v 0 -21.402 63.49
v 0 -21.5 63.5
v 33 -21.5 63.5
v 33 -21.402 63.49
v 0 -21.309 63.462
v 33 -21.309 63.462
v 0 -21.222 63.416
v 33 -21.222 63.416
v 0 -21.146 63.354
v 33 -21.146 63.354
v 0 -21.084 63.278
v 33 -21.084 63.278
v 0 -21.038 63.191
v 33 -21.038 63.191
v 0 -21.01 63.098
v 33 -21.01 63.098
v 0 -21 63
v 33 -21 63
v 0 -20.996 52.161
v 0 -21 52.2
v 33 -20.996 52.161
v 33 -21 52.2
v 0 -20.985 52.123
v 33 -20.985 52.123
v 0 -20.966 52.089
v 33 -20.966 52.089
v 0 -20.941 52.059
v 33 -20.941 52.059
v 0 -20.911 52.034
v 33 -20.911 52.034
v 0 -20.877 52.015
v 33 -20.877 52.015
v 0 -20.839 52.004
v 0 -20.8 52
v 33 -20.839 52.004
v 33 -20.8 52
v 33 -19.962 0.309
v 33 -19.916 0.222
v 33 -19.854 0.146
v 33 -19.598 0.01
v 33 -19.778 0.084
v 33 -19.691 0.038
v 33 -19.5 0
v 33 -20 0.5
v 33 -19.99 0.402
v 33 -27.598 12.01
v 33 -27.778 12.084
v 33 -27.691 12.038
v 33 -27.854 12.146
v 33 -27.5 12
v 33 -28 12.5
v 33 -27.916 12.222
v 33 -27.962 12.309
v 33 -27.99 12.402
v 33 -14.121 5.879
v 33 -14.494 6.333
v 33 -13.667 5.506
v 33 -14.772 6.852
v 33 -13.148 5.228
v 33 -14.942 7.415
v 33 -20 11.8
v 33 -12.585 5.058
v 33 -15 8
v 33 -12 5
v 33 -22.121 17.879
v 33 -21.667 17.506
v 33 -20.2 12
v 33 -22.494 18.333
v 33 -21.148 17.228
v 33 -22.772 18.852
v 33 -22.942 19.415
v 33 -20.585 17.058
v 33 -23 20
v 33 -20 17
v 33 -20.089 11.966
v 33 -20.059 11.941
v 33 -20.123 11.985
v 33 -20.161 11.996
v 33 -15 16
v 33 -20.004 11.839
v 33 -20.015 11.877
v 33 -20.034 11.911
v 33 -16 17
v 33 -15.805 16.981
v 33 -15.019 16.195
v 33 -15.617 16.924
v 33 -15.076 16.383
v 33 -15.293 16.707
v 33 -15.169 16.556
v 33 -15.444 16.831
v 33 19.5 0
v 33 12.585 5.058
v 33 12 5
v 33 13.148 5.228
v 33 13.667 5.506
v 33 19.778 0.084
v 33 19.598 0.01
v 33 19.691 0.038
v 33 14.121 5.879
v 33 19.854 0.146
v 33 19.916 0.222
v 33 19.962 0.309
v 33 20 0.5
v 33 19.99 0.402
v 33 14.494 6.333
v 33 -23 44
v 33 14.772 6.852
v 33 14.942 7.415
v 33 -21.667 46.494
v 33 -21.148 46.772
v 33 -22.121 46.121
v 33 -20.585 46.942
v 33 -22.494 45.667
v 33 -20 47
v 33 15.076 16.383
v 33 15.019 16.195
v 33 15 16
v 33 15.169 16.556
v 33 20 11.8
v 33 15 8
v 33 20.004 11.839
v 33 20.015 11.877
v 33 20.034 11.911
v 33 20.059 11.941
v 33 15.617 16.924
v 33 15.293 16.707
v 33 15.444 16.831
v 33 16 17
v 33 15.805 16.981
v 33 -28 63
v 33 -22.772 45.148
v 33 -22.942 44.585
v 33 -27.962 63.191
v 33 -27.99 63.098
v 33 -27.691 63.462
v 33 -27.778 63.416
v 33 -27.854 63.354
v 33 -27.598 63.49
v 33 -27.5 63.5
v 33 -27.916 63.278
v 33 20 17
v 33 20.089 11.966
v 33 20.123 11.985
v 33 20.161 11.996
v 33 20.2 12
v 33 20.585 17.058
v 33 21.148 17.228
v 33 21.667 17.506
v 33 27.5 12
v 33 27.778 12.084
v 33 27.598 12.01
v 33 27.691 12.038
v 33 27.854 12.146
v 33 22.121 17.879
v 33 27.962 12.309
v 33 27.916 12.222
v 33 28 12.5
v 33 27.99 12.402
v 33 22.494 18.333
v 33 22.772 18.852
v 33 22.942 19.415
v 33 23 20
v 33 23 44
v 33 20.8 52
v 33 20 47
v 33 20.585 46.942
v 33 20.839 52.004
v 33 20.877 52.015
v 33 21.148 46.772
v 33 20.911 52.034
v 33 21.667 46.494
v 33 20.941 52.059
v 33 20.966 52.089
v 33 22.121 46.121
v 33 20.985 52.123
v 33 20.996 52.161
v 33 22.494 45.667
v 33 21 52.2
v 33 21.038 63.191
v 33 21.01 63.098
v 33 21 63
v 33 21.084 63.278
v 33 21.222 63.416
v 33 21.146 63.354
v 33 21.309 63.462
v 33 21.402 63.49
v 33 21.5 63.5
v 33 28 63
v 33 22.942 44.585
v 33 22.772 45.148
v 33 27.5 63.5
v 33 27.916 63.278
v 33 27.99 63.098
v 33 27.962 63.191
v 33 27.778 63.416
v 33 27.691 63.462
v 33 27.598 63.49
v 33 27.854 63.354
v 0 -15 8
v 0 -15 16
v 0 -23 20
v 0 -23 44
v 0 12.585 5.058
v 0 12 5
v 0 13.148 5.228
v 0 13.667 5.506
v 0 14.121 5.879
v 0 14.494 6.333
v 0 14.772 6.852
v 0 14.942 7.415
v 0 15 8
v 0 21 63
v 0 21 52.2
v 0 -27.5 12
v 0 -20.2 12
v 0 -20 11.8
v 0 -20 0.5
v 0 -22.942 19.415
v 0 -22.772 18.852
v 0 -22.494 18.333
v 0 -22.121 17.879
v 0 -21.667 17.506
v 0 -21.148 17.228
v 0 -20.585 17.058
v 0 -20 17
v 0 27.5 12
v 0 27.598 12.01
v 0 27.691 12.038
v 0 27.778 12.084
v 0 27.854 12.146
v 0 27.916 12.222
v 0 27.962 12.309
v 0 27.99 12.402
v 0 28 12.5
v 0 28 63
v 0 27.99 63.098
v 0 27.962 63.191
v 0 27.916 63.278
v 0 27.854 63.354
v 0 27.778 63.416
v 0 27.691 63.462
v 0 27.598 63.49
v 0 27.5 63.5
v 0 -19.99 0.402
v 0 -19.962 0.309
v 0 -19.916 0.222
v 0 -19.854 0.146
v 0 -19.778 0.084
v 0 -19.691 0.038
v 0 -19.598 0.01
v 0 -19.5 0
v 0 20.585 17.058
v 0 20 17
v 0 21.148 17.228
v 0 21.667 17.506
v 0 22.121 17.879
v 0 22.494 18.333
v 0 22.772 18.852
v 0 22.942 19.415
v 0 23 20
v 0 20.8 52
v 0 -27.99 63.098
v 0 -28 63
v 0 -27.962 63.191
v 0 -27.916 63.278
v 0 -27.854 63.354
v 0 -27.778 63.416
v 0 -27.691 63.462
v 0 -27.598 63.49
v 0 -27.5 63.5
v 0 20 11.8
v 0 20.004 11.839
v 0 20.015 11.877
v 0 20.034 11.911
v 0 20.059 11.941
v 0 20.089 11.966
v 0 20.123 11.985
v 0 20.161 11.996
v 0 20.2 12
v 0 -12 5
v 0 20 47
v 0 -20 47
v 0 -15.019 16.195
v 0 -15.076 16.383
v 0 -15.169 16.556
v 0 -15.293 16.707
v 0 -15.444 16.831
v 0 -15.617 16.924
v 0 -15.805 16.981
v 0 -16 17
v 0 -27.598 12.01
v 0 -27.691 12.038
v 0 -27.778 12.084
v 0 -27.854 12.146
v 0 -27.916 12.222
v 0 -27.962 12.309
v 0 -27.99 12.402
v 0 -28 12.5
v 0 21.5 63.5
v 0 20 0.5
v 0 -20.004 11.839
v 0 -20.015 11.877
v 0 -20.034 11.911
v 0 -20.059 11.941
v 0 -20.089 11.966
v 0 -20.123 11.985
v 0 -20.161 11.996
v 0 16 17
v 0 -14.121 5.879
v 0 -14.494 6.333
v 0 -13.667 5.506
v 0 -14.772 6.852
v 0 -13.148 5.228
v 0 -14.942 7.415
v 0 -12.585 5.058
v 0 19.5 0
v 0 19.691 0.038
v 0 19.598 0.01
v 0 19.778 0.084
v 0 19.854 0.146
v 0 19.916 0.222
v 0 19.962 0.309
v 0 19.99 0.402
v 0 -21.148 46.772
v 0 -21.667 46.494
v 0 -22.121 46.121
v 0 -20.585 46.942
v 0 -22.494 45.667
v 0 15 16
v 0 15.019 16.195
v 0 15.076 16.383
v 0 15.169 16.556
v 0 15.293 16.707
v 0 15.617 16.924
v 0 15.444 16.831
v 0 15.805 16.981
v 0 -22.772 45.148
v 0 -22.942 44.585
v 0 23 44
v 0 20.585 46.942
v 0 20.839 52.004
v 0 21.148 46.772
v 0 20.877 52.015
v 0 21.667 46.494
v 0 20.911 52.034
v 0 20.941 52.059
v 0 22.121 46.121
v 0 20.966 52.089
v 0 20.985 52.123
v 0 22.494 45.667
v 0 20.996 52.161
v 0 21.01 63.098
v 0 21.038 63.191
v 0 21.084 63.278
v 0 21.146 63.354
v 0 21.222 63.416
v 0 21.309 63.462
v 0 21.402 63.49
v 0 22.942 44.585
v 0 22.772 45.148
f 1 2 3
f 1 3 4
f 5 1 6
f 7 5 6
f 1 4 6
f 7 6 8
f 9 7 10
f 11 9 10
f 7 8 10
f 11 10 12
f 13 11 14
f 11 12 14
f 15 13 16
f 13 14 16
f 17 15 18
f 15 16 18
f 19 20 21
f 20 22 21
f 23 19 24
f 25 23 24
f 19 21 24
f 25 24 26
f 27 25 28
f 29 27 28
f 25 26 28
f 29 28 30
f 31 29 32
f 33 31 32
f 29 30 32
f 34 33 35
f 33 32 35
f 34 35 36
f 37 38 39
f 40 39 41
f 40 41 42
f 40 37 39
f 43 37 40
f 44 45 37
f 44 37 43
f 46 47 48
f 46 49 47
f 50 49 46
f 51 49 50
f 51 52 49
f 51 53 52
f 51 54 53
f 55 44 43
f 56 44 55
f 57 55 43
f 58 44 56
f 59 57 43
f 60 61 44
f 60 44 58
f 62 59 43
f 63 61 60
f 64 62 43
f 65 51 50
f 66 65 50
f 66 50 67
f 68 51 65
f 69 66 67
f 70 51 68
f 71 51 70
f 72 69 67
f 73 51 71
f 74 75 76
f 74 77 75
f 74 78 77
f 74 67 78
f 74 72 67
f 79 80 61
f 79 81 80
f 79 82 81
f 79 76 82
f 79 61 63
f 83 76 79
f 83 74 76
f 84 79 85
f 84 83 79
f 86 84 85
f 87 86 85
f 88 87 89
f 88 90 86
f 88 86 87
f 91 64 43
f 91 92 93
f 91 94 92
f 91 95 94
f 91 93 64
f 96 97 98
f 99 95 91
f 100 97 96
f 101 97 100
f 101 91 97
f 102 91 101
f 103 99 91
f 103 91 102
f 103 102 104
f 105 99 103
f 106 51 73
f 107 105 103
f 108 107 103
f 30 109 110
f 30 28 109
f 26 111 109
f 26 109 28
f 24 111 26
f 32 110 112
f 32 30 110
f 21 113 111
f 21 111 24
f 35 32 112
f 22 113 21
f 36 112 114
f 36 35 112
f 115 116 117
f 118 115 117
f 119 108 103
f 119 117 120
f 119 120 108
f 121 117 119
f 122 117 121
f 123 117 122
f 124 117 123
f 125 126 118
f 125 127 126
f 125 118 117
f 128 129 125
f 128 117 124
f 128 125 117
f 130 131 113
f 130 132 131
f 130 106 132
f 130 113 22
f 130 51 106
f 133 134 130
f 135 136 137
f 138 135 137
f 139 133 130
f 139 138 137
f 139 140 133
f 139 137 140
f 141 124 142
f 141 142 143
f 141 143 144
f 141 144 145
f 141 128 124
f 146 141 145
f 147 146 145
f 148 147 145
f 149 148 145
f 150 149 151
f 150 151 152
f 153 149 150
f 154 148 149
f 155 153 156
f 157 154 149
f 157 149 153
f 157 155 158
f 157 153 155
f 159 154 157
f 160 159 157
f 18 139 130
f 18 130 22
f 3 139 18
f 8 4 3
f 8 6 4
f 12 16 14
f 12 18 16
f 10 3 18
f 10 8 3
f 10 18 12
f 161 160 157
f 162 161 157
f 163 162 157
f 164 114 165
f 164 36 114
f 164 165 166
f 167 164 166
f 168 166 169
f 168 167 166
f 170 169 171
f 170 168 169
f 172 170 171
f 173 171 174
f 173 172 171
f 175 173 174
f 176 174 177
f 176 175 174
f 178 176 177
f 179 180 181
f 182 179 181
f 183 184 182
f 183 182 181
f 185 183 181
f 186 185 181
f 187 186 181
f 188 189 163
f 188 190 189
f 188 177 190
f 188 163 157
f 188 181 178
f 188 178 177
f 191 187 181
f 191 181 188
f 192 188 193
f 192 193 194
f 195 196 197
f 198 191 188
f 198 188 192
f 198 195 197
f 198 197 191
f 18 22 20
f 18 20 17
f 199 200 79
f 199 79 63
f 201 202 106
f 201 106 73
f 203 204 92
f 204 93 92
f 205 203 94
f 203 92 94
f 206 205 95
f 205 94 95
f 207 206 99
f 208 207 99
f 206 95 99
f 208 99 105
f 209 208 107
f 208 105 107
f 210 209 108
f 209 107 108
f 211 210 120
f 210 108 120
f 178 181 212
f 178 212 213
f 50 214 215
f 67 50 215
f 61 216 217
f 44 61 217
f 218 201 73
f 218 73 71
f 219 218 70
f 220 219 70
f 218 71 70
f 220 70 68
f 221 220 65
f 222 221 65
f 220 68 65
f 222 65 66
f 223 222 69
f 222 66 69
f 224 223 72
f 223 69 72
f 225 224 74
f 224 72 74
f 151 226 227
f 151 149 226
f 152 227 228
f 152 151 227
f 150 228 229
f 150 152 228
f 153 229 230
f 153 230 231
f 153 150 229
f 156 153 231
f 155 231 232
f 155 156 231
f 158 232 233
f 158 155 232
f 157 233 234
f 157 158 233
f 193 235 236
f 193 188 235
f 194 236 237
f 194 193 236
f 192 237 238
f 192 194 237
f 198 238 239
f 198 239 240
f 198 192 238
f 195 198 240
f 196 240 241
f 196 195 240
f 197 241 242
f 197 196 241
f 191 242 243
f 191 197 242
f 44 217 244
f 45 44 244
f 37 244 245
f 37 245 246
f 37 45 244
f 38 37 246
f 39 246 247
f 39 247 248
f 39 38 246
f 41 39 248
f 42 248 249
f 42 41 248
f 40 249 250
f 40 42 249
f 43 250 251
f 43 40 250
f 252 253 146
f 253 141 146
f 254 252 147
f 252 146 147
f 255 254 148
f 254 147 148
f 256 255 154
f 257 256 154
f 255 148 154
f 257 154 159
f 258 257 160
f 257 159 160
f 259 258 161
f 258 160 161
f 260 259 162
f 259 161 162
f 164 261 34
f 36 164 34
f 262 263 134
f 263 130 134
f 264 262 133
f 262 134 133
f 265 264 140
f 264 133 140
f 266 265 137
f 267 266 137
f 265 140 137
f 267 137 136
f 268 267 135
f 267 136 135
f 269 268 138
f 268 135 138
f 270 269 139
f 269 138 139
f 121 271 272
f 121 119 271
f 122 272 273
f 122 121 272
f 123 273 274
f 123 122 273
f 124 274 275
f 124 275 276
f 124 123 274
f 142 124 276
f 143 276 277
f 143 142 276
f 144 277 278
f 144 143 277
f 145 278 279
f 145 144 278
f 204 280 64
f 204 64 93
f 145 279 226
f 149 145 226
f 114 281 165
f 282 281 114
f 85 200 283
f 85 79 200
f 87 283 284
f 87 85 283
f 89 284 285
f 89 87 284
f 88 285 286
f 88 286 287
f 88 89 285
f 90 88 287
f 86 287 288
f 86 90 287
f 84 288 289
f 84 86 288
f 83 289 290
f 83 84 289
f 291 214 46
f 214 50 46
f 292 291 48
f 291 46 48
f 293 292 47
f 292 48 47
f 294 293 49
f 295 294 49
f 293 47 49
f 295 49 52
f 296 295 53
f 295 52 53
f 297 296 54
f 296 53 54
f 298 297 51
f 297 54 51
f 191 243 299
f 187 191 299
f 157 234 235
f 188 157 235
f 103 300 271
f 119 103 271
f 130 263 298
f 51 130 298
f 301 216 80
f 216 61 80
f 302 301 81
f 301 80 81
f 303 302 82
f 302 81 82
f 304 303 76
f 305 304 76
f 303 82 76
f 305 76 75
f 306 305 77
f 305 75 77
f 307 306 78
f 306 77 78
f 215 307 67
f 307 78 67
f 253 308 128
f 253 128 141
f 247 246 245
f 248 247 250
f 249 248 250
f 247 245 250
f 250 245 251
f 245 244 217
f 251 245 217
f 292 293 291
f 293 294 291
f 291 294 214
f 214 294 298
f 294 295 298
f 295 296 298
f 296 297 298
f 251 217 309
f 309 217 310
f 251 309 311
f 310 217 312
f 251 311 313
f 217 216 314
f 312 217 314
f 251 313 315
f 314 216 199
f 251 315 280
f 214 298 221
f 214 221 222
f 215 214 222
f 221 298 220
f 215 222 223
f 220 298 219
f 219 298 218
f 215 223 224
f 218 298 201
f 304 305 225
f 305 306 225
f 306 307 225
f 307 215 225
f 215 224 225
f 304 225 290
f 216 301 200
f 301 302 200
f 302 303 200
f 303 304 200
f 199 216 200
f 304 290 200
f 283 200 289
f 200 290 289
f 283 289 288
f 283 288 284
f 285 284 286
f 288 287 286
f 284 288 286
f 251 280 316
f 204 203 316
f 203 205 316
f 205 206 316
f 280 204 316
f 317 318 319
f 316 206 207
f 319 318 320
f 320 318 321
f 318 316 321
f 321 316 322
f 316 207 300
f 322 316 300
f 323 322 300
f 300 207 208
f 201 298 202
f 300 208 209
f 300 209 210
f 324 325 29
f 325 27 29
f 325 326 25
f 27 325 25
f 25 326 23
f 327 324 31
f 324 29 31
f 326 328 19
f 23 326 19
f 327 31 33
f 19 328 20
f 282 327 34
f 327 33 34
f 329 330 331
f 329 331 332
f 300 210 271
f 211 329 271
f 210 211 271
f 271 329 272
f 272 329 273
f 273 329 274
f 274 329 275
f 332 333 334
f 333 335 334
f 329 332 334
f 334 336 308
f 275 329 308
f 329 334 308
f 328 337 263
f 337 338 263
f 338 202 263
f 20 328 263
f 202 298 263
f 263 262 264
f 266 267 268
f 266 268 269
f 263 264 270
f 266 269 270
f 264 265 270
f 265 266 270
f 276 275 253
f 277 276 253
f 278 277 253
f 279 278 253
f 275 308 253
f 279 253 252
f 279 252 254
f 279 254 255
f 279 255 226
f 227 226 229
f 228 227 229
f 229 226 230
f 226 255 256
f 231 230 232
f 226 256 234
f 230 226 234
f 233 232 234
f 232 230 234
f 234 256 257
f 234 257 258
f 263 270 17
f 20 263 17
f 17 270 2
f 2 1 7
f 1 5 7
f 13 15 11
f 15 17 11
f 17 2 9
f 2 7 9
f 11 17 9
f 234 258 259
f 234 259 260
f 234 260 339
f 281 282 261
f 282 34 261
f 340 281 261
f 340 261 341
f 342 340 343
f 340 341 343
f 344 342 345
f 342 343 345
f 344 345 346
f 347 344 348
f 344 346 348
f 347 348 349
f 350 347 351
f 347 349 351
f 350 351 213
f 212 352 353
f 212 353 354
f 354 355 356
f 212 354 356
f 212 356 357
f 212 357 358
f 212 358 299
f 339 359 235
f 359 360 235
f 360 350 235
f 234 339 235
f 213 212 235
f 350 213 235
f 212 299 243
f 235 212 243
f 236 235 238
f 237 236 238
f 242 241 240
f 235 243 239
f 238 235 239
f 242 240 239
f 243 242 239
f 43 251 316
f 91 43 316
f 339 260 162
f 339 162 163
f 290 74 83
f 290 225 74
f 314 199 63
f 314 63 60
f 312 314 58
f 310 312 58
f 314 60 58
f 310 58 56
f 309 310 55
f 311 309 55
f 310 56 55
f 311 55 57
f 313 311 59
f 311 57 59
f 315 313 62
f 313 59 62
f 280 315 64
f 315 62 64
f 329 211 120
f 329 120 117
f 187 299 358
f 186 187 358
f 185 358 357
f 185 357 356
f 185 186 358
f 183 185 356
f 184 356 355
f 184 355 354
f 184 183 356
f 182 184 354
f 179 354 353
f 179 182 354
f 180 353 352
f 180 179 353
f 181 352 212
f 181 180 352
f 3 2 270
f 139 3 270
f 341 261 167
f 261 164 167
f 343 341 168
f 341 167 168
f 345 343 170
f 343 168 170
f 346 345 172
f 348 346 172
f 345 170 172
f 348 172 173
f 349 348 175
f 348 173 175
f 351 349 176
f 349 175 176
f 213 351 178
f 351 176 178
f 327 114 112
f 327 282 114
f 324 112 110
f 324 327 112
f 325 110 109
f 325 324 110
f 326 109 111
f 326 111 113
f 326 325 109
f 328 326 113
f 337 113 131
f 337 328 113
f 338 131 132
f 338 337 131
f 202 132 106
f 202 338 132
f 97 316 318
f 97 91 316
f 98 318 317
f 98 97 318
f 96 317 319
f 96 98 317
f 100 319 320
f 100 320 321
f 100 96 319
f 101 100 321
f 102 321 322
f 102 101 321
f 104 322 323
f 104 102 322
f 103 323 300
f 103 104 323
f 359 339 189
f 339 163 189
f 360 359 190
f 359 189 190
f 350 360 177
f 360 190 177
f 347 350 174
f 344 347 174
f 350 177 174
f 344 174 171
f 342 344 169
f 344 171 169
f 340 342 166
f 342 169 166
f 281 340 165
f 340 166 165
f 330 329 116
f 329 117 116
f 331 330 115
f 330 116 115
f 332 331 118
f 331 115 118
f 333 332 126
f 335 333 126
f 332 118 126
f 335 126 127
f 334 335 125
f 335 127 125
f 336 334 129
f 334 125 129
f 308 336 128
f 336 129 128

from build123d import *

# Parameters (mm, degrees)
F1_DEPTH    = 33
F2_T        = 5
F2_T3_DEPTH = 43
F3_R        = 0.2
F4_R        = 0.5
F5_R        = 3
F6_R        = 1


# Not quite as in the source:
# - a shell that OpenCascade refuses in one call is made with other operations: the cavity is built on its own and cut out


with BuildPart() as f1:
    # F0 (on Right) → F1 (new body)
    with BuildSketch(Plane.YZ):
        Polygon((-20, 12), (-20, 0), (20, 0), (20, 12), (28, 12), (28, 63.5), (21, 63.5), (21, 52), (-21, 52), (-21, 63.5), (-28, 63.5), (-28, 12), align=None)
    extrude(amount=F1_DEPTH)

    # F2: shell of thickness 5, made by hand


with BuildPart() as f2_core1:
    # F2_t2: copy of F1
    add(f1.part)

    # the walls: a layer under each face that stays
    f2_faces = [f2_core1.faces().sort_by_distance(p)[0] for p in [
        (16.5, -20, 6),
        (16.5, 0, 0),
        (16.5, 20, 6),
        (16.5, 24, 12),
        (16.5, 28, 37.75),
        (16.5, 24.5, 63.5),
        (16.5, 21, 57.75),
        (16.5, 0, 52),
        (16.5, -21, 57.75),
        (16.5, -24.5, 63.5),
        (16.5, -28, 37.75),
        (16.5, -24, 12),
    ]]
    thicken(f2_faces, amount=-F2_T, mode=Mode.SUBTRACT)

    # F2_s4 → F2_t3 (cut)
    with BuildSketch(Plane.YZ.offset(-5)):
        Polygon((-20.05, 11.95), (-15, 12), (-15, 17), (-20, 17), align=None)
        Polygon((20.05, 11.95), (15, 12), (15, 17), (20, 17), align=None)
        Polygon((20.95, 52.05), (26, 52), (26, 47), (21, 47), align=None)
        Polygon((-20.95, 52.05), (-21, 47), (-26, 47), (-26, 52), align=None)
    extrude(amount=F2_T3_DEPTH, mode=Mode.SUBTRACT)


with BuildPart() as f1_1:
    add(f1.part)

    # what is left inside the walls is the cavity
    f2_cavity = [f2_core1.part.solids().sort_by_distance(p)[0] for p in [
        (32.95, 0, 19),
    ]]
    add(f2_cavity, mode=Mode.SUBTRACT)

    # F3
    f3_edges = [f1_1.edges().sort_by_distance(p)[0] for p in [
        (16.5, 20, 12),
        (16.5, -20, 12),
        (16.5, -21, 52),
        (16.5, 21, 52),
    ]]
    fillet(f3_edges, radius=F3_R)

    # F4
    f4_edges = [f1_1.edges().sort_by_distance(p)[0] for p in [
        (16.5, 21, 63.5),
        (16.5, 28, 63.5),
        (16.5, 28, 12),
        (16.5, 20, 0),
        (16.5, -20, 0),
        (16.5, -28, 12),
        (16.5, -28, 63.5),
        (16.5, -21, 63.5),
    ]]
    fillet(f4_edges, radius=F4_R)

    # F5
    f5_edges = [f1_1.edges().sort_by_distance(p)[0] for p in [
        (16.5, -23, 17),
        (16.5, 23, 17),
        (16.5, 15, 5),
        (16.5, -15, 5),
        (16.5, 23, 47),
        (16.5, -23, 47),
    ]]
    fillet(f5_edges, radius=F5_R)

    # F6
    f6_edges = [f1_1.edges().sort_by_distance(p)[0] for p in [
        (16.5, -15, 17),
        (16.5, 15, 17),
    ]]
    fillet(f6_edges, radius=F6_R)


solid = f1_1.part
